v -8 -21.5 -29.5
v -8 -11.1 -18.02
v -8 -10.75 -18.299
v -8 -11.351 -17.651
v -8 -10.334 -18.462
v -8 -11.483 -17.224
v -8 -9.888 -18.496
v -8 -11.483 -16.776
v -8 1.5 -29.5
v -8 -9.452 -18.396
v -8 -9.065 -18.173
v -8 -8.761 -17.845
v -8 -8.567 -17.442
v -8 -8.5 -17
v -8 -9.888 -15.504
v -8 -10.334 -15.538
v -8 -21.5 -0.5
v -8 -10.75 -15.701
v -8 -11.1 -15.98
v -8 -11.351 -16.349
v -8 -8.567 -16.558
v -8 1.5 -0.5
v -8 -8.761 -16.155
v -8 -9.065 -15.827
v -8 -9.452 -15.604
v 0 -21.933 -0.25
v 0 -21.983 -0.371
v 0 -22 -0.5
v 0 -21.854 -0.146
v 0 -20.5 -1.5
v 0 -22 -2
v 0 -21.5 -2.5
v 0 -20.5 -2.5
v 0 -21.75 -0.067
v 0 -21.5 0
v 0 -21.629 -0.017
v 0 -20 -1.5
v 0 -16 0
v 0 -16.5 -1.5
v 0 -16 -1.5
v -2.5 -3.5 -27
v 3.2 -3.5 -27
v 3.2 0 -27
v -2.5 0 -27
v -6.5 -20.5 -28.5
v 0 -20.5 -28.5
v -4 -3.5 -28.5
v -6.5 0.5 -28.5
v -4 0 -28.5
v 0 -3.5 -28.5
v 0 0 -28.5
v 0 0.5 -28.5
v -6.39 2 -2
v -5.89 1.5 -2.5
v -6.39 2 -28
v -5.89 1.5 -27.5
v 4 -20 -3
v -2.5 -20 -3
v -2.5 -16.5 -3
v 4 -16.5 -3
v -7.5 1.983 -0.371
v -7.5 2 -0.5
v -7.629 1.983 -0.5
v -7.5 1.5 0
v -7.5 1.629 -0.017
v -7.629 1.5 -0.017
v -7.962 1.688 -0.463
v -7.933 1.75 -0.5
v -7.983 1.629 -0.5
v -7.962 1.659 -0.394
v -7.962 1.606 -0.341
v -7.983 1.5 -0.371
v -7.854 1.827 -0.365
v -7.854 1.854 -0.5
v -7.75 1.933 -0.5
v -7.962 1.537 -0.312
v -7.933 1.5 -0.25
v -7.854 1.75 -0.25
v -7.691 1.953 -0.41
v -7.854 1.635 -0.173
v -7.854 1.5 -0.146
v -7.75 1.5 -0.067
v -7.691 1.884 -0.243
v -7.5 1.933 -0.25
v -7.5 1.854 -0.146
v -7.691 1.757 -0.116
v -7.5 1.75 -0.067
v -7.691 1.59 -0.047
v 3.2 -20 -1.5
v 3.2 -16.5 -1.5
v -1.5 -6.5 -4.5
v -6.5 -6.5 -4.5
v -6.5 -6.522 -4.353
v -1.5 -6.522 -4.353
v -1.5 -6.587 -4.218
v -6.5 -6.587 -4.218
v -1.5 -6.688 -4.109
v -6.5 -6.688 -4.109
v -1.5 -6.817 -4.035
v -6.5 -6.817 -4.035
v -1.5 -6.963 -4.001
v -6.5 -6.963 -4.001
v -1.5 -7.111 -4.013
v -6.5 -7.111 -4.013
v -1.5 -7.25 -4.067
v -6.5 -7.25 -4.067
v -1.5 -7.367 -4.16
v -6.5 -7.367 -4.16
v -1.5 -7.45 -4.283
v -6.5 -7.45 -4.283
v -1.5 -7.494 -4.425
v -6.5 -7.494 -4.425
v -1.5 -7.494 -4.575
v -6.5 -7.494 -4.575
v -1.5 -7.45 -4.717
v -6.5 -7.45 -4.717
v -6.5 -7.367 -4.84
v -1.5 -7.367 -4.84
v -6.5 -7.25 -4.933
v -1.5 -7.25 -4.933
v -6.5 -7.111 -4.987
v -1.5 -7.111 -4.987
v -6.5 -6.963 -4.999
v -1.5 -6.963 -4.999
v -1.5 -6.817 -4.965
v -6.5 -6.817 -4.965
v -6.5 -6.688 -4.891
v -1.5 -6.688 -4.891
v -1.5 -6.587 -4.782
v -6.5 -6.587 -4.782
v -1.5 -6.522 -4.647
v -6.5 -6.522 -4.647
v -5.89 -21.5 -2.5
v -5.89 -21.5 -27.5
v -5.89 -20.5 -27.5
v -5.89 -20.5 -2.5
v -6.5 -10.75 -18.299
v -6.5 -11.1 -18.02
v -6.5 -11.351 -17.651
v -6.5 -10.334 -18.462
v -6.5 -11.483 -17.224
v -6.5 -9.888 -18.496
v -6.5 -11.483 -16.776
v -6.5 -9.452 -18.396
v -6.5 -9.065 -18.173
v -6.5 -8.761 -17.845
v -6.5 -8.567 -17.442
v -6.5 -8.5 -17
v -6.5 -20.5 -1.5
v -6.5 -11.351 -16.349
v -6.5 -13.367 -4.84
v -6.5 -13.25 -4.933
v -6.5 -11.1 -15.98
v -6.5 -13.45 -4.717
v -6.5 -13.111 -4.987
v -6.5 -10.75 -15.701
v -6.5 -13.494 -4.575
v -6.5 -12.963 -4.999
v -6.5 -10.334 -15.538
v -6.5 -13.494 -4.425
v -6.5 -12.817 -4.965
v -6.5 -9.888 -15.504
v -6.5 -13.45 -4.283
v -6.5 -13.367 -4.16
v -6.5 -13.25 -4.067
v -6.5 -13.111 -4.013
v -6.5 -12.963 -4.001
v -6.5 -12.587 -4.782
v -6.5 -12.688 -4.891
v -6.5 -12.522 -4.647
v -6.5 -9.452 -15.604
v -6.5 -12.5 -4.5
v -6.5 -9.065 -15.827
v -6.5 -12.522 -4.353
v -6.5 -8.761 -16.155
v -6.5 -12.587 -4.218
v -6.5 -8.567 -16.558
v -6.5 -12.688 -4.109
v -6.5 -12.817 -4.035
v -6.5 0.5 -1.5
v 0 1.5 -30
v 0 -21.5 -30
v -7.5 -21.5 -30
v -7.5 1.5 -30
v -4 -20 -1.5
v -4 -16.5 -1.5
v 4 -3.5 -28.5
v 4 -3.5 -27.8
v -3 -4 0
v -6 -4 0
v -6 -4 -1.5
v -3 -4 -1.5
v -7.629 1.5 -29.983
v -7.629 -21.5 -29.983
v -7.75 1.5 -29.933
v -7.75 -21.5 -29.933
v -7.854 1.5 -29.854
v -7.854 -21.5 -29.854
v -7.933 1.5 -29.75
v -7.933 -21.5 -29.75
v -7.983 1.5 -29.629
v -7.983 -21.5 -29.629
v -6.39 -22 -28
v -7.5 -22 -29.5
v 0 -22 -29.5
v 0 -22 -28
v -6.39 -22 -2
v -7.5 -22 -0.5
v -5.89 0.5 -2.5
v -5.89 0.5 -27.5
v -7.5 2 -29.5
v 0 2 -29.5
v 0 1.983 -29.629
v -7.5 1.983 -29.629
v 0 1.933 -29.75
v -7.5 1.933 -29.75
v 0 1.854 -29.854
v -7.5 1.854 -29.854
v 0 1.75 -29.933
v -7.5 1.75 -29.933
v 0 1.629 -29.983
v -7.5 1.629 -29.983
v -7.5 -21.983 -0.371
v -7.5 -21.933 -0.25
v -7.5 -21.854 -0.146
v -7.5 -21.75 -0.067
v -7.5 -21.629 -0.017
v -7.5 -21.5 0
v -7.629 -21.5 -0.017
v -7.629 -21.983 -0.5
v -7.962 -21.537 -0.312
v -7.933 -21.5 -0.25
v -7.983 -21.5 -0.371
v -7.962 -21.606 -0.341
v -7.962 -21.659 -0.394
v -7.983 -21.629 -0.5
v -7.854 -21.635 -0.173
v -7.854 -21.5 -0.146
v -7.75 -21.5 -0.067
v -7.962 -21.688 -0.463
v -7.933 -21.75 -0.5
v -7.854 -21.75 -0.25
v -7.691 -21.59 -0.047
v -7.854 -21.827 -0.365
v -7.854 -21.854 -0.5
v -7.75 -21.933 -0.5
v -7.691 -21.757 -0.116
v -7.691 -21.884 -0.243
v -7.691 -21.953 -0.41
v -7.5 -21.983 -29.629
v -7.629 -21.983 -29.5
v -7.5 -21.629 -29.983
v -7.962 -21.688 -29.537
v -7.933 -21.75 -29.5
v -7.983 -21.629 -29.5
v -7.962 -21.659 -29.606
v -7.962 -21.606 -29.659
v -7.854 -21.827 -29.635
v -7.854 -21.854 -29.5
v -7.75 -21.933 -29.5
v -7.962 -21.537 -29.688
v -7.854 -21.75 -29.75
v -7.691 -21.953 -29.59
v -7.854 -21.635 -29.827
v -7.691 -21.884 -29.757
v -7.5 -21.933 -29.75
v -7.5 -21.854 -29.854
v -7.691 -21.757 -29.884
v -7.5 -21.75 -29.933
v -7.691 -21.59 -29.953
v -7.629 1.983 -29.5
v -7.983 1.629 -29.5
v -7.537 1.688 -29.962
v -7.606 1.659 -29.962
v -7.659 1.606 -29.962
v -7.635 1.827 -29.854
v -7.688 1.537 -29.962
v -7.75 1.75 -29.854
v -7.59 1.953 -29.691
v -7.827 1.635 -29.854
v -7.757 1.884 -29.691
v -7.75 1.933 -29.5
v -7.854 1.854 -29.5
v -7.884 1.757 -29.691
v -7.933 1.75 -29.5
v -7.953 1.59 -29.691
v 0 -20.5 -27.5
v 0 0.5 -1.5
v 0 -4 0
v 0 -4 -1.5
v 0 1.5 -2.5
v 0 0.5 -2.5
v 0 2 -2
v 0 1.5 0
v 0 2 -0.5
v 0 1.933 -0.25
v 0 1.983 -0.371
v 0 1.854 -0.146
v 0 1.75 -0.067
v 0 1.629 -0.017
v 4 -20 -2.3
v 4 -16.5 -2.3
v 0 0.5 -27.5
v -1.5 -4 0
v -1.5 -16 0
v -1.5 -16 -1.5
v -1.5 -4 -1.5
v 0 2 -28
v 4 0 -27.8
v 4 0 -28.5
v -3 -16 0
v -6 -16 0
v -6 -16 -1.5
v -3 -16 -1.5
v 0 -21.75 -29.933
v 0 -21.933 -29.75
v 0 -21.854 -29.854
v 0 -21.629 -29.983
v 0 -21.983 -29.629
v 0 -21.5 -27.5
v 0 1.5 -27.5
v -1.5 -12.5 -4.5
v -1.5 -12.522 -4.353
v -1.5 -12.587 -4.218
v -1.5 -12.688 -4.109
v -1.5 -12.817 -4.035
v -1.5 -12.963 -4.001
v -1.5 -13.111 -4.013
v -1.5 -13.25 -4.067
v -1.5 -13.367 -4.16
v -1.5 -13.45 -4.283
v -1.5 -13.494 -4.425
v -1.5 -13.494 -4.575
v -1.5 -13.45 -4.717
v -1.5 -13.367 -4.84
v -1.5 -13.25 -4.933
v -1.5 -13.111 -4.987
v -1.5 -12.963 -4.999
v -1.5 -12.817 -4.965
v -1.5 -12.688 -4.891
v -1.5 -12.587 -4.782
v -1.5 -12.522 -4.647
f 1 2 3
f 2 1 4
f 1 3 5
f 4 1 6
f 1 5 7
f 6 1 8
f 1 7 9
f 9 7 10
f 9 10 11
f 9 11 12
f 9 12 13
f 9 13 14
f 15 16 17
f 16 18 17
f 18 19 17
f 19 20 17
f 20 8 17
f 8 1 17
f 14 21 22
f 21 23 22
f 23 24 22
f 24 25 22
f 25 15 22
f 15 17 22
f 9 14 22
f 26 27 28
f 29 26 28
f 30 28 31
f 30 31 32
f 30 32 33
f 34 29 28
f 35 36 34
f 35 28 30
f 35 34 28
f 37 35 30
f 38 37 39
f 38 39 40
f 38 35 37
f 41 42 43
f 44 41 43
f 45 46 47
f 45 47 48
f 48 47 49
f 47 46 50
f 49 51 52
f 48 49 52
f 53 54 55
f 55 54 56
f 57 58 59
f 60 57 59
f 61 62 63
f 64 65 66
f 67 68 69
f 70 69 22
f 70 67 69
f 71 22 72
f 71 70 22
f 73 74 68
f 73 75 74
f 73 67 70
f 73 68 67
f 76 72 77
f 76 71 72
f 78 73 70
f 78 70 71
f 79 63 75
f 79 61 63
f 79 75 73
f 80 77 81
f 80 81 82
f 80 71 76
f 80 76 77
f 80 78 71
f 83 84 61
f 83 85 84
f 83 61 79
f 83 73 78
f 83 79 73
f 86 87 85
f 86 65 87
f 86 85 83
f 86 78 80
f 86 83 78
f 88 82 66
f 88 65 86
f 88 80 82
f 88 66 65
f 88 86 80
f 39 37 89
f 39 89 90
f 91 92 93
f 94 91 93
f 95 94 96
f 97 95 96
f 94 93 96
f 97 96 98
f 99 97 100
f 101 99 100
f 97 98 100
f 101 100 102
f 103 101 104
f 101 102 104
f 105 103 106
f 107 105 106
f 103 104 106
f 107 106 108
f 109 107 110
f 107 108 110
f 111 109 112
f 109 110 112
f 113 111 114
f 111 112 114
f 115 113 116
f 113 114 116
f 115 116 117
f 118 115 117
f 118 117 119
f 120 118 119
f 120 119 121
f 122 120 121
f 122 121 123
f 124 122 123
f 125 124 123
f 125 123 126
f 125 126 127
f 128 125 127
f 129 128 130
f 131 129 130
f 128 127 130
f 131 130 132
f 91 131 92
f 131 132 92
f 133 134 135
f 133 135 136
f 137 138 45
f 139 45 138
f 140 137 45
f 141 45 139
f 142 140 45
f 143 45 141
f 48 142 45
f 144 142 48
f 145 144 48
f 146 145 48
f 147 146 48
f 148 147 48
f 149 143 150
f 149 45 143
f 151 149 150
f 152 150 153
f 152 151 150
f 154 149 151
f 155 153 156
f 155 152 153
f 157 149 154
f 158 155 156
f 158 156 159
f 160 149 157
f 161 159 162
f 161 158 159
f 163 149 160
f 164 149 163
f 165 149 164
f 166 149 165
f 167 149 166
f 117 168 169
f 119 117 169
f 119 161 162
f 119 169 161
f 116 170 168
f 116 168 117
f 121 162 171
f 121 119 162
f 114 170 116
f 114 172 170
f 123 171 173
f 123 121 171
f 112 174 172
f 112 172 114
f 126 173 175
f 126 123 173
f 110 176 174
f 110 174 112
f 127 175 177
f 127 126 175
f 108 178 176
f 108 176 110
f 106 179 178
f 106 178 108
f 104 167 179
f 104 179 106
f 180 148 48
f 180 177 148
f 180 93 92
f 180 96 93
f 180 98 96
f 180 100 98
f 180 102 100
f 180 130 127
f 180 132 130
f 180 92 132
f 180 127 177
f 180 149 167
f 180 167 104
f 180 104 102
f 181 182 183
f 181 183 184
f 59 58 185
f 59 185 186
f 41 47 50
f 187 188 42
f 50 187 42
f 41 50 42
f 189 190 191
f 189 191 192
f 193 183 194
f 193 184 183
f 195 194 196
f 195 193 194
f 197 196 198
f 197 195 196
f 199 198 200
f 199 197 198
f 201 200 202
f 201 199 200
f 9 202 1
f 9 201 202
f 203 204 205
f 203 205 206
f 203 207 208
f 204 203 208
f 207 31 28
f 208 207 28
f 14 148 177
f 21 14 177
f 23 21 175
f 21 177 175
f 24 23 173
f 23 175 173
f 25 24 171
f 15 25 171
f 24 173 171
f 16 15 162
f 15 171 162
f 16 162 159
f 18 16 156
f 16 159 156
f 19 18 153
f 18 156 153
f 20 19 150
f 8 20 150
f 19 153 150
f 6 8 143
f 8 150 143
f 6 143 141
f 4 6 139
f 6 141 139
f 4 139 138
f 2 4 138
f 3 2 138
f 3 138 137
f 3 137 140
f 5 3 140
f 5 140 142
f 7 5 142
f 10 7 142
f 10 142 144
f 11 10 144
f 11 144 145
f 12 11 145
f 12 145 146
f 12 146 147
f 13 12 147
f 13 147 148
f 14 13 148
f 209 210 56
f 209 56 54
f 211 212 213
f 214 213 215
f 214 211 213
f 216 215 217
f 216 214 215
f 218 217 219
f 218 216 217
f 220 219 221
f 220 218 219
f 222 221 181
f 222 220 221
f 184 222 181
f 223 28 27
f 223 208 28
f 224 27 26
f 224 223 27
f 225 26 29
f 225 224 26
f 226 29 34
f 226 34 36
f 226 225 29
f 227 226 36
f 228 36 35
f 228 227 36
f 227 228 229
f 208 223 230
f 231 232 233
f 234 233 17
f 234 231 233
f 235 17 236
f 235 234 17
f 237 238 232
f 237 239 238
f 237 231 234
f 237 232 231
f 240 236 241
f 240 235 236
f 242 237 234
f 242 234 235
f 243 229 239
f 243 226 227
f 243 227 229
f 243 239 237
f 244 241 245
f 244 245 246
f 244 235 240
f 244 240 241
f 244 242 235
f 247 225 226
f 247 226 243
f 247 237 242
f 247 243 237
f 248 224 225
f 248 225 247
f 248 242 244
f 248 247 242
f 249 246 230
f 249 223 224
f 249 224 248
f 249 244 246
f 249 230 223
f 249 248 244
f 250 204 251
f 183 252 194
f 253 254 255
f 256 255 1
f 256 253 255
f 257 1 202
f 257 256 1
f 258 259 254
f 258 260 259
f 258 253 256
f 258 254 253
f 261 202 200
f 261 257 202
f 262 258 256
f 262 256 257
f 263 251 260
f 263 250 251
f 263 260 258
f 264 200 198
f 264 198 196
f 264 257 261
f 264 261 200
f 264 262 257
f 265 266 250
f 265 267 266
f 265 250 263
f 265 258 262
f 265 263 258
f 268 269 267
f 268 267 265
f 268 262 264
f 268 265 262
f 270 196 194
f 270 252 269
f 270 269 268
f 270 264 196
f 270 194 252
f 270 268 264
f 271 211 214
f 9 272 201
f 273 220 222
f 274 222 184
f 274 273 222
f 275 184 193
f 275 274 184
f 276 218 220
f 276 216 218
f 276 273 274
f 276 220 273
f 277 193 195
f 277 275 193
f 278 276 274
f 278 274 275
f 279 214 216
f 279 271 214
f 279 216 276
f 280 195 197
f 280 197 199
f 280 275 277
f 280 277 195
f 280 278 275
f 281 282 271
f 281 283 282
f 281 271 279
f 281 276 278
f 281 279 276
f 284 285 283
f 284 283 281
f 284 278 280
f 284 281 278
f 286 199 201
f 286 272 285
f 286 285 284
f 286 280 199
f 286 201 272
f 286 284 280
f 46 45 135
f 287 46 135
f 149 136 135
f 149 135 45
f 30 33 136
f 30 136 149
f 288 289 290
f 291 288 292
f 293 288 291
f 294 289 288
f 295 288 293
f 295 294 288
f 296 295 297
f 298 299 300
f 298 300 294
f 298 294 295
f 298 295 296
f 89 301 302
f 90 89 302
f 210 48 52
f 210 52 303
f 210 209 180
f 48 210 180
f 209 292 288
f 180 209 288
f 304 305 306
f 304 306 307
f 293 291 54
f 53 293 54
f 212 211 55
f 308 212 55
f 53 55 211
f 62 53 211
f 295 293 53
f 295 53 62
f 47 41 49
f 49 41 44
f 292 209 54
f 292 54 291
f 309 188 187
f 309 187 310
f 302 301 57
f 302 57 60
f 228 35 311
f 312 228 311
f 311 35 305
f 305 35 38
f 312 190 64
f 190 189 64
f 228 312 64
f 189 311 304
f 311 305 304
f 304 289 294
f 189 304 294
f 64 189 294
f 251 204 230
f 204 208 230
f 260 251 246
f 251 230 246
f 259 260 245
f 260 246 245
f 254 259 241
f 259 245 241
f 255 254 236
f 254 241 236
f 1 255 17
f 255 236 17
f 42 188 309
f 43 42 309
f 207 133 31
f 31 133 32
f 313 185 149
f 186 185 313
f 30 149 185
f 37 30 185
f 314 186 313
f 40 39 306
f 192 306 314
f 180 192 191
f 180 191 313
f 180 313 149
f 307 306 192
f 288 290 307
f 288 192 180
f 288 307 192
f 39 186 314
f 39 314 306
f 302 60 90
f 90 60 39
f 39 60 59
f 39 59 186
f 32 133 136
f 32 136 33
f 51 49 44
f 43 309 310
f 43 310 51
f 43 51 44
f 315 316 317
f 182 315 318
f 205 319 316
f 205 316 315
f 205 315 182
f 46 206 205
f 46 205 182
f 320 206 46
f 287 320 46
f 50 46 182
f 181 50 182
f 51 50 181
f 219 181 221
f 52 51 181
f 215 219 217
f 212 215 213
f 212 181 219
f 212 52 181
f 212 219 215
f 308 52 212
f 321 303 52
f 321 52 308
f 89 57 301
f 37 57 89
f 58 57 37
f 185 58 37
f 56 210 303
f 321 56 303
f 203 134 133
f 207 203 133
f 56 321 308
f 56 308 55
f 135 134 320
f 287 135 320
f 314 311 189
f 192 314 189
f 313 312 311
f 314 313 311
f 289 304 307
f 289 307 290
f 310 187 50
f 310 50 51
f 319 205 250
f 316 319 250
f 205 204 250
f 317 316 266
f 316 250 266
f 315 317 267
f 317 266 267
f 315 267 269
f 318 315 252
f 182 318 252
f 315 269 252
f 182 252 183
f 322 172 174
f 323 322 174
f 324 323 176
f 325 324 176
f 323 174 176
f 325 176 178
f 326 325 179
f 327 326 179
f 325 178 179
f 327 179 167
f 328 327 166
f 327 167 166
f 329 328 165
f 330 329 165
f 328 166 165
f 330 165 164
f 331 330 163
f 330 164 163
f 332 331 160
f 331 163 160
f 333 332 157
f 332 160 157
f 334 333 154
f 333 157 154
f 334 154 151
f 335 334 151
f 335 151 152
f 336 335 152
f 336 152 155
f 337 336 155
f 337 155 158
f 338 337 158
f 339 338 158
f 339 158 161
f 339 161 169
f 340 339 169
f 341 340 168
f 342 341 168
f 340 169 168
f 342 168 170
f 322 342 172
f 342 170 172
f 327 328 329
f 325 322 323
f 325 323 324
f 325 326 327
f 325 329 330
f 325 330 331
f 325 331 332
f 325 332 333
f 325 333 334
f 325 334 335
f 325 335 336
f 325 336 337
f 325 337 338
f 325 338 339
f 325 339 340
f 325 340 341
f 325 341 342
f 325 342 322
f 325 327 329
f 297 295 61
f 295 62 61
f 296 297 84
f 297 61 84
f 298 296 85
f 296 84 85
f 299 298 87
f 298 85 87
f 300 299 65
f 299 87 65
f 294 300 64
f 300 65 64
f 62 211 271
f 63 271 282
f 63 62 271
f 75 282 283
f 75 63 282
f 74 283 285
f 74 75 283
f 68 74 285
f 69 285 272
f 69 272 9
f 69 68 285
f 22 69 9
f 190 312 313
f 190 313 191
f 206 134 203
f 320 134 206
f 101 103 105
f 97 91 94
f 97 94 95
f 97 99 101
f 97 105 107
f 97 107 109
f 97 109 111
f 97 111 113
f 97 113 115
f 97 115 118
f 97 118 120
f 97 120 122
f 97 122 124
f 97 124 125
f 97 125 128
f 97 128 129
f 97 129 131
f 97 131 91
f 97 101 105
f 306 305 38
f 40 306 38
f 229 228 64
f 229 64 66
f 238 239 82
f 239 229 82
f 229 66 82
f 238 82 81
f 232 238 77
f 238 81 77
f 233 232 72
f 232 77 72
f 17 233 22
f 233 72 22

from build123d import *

# Parameters (mm, degrees)
F1_W      = 24
F1_H      = 30
F2_DEPTH  = 8
F3_T      = -1.5
F4_W      = 3
F4_H      = 12
F5_DEPTH  = 5
F6_W      = 8
F6_H      = 25
F7_DEPTH  = 30
F8_W      = 3.5
F8_H      = 1.5
F9_DEPTH  = 4
F10_SIZE  = 0.8
F11_R     = 1.5
F12_DEPTH = 25
F13_R     = 0.5
F14_SIZE  = 0.5
F15_R     = 0.5
F16_DEPTH = 5
F17_SIZE  = 1.49999


# Not quite as in the source:
# - a fillet or chamfer is up to 0.001 mm smaller than in the source, because OpenCascade refuses the exact size


with BuildPart() as f2:
    # F1 (on Right) → F2 (new body)
    with BuildSketch(Plane.YZ):
        with Locations((-10, -15)):
            Rectangle(F1_W, F1_H)
    extrude(amount=-F2_DEPTH)

    # F3
    f3_openings = [f2.faces().sort_by_distance(p)[0] for p in [
        (0, -10, -15),
    ]]
    offset(amount=F3_T, openings=f3_openings)

    # F4 (on Top) → F5 (cut)
    with BuildSketch(Plane.XY):
        with Locations((0, -10)):
            Rectangle(F4_W, F4_H)
        with Locations((-4.5, -10)):
            Rectangle(F4_W, F4_H)
    extrude(amount=-F5_DEPTH, mode=Mode.SUBTRACT)

    # F6 (on face) → F7 (cut)
    with BuildSketch(Plane.XZ.offset(22)):
        with Locations((-1.8903282698, -15)):
            Rectangle(F6_W, F6_H)
    extrude(amount=-F7_DEPTH, mode=Mode.SUBTRACT)

    # F8 (on Right) → F9 (join, symmetric)
    with BuildSketch(Plane.YZ):
        with Locations((-18.25, -2.25)):
            Rectangle(F8_W, F8_H)
        with Locations((-1.75, -27.75)):
            Rectangle(F8_W, F8_H)
    extrude(amount=F9_DEPTH, both=True)

    # F10
    f10_edges = [f2.edges().sort_by_distance(p)[0] for p in [
        (4, -18.25, -1.5),
        (4, -1.75, -27),
    ]]
    chamfer(f10_edges, length=F10_SIZE)

    # F11 (on Right) → F12 (cut)
    with BuildSketch(Plane.YZ):
        with Locations((-10, -17)):
            Circle(F11_R)
    extrude(amount=-F12_DEPTH, mode=Mode.SUBTRACT)

    # F13
    f13_edges = [f2.edges().sort_by_distance(p)[0] for p in [
        (-4, 2, 0),
        (-8, 2, -15),
        (-4, -22, 0),
        (-4, -22, -30),
        (-4, 2, -30),
        (-8, -10, 0),
        (-8, -22, -15),
        (-8, -10, -30),
    ]]
    fillet(f13_edges, radius=F13_R)

    # F14
    f14_edges = [f2.edges().sort_by_distance(p)[0] for p in [
        (-5.890328, 2, -15),
        (-2.945164, 2, -2.5),
        (-2.945164, 2, -27.5),
        (-2.945164, -22, -2.5),
        (-5.890328, -22, -15),
        (-2.945164, -22, -27.5),
    ]]
    chamfer(f14_edges, length=F14_SIZE)

    # F15 (on face) → F16 (join)
    with BuildSketch(Plane.YZ.offset(-6.5)):
        with Locations((-13, -4.5)):
            Circle(F15_R)
        with Locations((-7, -4.5)):
            Circle(F15_R)
    extrude(amount=F16_DEPTH)

    # F17 (size 1.5 in the source; OpenCascade refuses exactly that, so slightly less here)
    f17_edges = [f2.edges().sort_by_distance(p)[0] for p in [
        (-4, -18.25, -3),
        (-4, -1.75, -27),
    ]]
    chamfer(f17_edges, length=F17_SIZE)


solid = f2.part
